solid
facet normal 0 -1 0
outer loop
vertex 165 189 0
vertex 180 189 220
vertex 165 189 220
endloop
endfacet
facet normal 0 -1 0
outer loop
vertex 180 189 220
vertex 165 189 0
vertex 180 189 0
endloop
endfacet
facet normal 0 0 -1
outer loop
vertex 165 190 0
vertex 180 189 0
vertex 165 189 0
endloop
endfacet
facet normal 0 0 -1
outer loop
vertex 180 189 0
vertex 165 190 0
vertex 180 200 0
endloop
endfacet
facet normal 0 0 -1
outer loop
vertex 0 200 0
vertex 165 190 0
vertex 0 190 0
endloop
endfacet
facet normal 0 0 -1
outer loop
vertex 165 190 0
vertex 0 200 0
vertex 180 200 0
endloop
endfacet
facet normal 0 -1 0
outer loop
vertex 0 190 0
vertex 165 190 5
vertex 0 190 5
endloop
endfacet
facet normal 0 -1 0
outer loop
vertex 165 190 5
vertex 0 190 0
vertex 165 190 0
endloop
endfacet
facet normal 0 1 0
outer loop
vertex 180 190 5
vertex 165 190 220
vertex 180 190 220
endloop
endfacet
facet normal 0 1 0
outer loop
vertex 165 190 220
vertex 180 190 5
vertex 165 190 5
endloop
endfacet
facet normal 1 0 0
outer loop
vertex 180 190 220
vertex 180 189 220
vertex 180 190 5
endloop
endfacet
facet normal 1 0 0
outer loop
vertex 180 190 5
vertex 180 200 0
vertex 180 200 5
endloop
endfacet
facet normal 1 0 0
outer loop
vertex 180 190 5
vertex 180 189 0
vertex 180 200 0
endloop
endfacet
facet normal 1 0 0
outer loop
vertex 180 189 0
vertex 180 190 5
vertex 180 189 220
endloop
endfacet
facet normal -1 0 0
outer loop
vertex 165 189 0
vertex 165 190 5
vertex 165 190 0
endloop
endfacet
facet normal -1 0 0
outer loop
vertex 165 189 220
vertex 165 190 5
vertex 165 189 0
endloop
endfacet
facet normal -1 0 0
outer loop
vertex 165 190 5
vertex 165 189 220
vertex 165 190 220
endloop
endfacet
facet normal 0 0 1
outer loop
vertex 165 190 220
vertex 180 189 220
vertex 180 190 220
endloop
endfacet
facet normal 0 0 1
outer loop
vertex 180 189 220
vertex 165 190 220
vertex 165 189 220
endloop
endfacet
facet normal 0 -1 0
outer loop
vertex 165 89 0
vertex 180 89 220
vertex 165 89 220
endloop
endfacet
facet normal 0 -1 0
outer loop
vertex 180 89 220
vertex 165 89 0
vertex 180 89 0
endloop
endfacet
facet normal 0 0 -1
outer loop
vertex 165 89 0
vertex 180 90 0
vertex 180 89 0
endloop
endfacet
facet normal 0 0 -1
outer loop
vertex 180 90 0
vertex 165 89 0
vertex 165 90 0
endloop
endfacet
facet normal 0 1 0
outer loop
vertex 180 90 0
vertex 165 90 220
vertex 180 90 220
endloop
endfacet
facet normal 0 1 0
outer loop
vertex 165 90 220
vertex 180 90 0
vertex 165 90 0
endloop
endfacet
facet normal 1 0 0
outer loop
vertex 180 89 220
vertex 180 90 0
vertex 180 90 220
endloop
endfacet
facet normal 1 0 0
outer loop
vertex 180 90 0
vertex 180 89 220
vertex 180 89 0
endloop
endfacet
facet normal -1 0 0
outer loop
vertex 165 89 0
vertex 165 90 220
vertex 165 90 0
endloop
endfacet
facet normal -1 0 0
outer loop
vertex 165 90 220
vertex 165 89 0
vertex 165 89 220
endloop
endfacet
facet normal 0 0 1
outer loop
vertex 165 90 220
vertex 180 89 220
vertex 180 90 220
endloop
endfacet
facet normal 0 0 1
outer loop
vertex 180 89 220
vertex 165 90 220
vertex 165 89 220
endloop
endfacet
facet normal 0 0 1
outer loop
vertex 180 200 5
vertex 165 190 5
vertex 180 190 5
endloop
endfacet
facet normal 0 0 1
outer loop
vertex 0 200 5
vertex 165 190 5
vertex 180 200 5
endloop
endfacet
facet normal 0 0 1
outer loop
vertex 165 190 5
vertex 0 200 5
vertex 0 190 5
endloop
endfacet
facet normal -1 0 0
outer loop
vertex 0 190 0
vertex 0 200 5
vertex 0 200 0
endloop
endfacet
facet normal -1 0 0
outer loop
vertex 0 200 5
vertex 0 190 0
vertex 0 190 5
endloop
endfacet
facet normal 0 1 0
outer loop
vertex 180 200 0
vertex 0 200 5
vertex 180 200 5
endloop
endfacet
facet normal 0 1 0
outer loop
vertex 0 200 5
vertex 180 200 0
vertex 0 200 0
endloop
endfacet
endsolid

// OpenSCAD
module tiled_wall(wall_width, wall_height, tile_widthx, tile_heighty, gap_size, offset_x, offset_y, center_x, center_y) {
    
    points = [[0,0],[wall_width,0],[wall_width, wall_height], [0, wall_height]];
    tiled_poly_wall(wall_width, wall_height, points,tile_widthx, tile_heighty, gap_size, offset_x, offset_y, center_x, center_y);
}


// wall_width, wall_height - dimensions of a square wall
// points - pologon points for non square walls
// tile_widthx, tile_heighty, gap_size - tile and gap size
// offset_x, offset_y - offset to move tiles ... tip use center=true & offset = tile/2 to center differntly !
// center_x, center_y - when true will center the tiles 
//
// works by assuming a 1/2 gap_size margin along the edges of the tile 
module tiled_poly_wall(wall_width, wall_height, points, tile_widthx, tile_heighty, gap_size, offset_x, offset_y, center_x, center_y) {
    
    tile_width = tile_widthx + gap_size;
    tile_height = tile_heighty + gap_size;
 
//    color("gray")
    //cube([wall_width, wall_height, 1]);
   
    intersection(){
        //color("gray")
        //cube([wall_width, wall_height, 2]);
        polygon(points=points);

        num_tiles_x = ceil(wall_width / tile_width); // Number of tiles in X direction
        num_tiles_y = ceil(wall_height / tile_height); // Number of tiles in Y direction
        
        center_x = center_x ? (wall_width - tile_width) /2 : 0;
        center_y = center_y ? (wall_height - tile_height) / 2 : 0;

        tx = floor(num_tiles_x/2);
        ty = floor(num_tiles_y/2);

        x1 = center_x ? -tx-1 : 0; 
        x2 = center_x ? tx: num_tiles_x;
        
        y1 = center_y ? -ty-1 : 0; 
        y2 = center_y ? ty: num_tiles_y;
        
        
        for (x = [x1 :1: x2]) {
            for (y = [y1 :1: y2]) {
                ox = offset_x + center_x + x * tile_width;
                oy = offset_y + center_y + y * tile_height;
                // draw tile 
                union(){
                translate([ox+(gap_size/2) , oy+(gap_size/2) , 0])
                //color("lightgray") 
                    cube([tile_width-gap_size, tile_height-gap_size, 2]);
                }
            }
        }
    }
        
}



x = 180;
y = 280; // 90-100-100
tile_x = 60;
tile_y = 20;
gap = 1;//0.4;

color("gray") {
//cube([x,y,1]);
    
  
y1 = 90; // shower
y2 = 100; //wc
y3 = 90; //sink
h1 = 120; // inclined wall
h = 220; //total h
points = [[0,0],[0,h1],[y1,h],[y1,0]];
//polygon(points);
    
// back 
translate([0,y,0]) rotate([90,0,0]) tiled_wall(x,h1,tile_x, tile_y, gap, tile_x/2,0, true, false);
    
//// inclined side 1     
translate([0,y,0]) 
rotate([90,0,-90]) 
tiled_poly_wall(y1, h, points, tile_x, tile_y, gap, tile_x/2, 0, true, false);

//// inclined side 2     
translate([x,y,0]) 
rotate([90,0,-90]) 
tiled_poly_wall(y1, h, points, tile_x, tile_y, gap, tile_x/2, 0, true, false);


// toilet wall
//
translate([x,y-y1,0]) rotate([90,-90,0]) cube([h,15,1]); 
//
translate([x-15,y1+y2,0]) 
rotate([90,0,-90])
tiled_wall(y2, h, tile_x, tile_y, gap, tile_x/2, 0, true, false);
 
////sink wall
//    
translate([x,y3,0]) rotate([90,-90,0]) cube([h,15,1]); 
//
translate([x,y3,0]) 
rotate([90,0,-90])
tiled_wall(y3, h, tile_x, tile_y, gap, tile_x/2, 0, true, false);


translate([0,y-90,0]) cube([x,10,5]);
tiled_wall(x, y-90, 45, 45, gap, 45/2, 0, true, false);


// floor 



}



//tiled_wall(200,100,20, 20, 0.4, 0,0);
